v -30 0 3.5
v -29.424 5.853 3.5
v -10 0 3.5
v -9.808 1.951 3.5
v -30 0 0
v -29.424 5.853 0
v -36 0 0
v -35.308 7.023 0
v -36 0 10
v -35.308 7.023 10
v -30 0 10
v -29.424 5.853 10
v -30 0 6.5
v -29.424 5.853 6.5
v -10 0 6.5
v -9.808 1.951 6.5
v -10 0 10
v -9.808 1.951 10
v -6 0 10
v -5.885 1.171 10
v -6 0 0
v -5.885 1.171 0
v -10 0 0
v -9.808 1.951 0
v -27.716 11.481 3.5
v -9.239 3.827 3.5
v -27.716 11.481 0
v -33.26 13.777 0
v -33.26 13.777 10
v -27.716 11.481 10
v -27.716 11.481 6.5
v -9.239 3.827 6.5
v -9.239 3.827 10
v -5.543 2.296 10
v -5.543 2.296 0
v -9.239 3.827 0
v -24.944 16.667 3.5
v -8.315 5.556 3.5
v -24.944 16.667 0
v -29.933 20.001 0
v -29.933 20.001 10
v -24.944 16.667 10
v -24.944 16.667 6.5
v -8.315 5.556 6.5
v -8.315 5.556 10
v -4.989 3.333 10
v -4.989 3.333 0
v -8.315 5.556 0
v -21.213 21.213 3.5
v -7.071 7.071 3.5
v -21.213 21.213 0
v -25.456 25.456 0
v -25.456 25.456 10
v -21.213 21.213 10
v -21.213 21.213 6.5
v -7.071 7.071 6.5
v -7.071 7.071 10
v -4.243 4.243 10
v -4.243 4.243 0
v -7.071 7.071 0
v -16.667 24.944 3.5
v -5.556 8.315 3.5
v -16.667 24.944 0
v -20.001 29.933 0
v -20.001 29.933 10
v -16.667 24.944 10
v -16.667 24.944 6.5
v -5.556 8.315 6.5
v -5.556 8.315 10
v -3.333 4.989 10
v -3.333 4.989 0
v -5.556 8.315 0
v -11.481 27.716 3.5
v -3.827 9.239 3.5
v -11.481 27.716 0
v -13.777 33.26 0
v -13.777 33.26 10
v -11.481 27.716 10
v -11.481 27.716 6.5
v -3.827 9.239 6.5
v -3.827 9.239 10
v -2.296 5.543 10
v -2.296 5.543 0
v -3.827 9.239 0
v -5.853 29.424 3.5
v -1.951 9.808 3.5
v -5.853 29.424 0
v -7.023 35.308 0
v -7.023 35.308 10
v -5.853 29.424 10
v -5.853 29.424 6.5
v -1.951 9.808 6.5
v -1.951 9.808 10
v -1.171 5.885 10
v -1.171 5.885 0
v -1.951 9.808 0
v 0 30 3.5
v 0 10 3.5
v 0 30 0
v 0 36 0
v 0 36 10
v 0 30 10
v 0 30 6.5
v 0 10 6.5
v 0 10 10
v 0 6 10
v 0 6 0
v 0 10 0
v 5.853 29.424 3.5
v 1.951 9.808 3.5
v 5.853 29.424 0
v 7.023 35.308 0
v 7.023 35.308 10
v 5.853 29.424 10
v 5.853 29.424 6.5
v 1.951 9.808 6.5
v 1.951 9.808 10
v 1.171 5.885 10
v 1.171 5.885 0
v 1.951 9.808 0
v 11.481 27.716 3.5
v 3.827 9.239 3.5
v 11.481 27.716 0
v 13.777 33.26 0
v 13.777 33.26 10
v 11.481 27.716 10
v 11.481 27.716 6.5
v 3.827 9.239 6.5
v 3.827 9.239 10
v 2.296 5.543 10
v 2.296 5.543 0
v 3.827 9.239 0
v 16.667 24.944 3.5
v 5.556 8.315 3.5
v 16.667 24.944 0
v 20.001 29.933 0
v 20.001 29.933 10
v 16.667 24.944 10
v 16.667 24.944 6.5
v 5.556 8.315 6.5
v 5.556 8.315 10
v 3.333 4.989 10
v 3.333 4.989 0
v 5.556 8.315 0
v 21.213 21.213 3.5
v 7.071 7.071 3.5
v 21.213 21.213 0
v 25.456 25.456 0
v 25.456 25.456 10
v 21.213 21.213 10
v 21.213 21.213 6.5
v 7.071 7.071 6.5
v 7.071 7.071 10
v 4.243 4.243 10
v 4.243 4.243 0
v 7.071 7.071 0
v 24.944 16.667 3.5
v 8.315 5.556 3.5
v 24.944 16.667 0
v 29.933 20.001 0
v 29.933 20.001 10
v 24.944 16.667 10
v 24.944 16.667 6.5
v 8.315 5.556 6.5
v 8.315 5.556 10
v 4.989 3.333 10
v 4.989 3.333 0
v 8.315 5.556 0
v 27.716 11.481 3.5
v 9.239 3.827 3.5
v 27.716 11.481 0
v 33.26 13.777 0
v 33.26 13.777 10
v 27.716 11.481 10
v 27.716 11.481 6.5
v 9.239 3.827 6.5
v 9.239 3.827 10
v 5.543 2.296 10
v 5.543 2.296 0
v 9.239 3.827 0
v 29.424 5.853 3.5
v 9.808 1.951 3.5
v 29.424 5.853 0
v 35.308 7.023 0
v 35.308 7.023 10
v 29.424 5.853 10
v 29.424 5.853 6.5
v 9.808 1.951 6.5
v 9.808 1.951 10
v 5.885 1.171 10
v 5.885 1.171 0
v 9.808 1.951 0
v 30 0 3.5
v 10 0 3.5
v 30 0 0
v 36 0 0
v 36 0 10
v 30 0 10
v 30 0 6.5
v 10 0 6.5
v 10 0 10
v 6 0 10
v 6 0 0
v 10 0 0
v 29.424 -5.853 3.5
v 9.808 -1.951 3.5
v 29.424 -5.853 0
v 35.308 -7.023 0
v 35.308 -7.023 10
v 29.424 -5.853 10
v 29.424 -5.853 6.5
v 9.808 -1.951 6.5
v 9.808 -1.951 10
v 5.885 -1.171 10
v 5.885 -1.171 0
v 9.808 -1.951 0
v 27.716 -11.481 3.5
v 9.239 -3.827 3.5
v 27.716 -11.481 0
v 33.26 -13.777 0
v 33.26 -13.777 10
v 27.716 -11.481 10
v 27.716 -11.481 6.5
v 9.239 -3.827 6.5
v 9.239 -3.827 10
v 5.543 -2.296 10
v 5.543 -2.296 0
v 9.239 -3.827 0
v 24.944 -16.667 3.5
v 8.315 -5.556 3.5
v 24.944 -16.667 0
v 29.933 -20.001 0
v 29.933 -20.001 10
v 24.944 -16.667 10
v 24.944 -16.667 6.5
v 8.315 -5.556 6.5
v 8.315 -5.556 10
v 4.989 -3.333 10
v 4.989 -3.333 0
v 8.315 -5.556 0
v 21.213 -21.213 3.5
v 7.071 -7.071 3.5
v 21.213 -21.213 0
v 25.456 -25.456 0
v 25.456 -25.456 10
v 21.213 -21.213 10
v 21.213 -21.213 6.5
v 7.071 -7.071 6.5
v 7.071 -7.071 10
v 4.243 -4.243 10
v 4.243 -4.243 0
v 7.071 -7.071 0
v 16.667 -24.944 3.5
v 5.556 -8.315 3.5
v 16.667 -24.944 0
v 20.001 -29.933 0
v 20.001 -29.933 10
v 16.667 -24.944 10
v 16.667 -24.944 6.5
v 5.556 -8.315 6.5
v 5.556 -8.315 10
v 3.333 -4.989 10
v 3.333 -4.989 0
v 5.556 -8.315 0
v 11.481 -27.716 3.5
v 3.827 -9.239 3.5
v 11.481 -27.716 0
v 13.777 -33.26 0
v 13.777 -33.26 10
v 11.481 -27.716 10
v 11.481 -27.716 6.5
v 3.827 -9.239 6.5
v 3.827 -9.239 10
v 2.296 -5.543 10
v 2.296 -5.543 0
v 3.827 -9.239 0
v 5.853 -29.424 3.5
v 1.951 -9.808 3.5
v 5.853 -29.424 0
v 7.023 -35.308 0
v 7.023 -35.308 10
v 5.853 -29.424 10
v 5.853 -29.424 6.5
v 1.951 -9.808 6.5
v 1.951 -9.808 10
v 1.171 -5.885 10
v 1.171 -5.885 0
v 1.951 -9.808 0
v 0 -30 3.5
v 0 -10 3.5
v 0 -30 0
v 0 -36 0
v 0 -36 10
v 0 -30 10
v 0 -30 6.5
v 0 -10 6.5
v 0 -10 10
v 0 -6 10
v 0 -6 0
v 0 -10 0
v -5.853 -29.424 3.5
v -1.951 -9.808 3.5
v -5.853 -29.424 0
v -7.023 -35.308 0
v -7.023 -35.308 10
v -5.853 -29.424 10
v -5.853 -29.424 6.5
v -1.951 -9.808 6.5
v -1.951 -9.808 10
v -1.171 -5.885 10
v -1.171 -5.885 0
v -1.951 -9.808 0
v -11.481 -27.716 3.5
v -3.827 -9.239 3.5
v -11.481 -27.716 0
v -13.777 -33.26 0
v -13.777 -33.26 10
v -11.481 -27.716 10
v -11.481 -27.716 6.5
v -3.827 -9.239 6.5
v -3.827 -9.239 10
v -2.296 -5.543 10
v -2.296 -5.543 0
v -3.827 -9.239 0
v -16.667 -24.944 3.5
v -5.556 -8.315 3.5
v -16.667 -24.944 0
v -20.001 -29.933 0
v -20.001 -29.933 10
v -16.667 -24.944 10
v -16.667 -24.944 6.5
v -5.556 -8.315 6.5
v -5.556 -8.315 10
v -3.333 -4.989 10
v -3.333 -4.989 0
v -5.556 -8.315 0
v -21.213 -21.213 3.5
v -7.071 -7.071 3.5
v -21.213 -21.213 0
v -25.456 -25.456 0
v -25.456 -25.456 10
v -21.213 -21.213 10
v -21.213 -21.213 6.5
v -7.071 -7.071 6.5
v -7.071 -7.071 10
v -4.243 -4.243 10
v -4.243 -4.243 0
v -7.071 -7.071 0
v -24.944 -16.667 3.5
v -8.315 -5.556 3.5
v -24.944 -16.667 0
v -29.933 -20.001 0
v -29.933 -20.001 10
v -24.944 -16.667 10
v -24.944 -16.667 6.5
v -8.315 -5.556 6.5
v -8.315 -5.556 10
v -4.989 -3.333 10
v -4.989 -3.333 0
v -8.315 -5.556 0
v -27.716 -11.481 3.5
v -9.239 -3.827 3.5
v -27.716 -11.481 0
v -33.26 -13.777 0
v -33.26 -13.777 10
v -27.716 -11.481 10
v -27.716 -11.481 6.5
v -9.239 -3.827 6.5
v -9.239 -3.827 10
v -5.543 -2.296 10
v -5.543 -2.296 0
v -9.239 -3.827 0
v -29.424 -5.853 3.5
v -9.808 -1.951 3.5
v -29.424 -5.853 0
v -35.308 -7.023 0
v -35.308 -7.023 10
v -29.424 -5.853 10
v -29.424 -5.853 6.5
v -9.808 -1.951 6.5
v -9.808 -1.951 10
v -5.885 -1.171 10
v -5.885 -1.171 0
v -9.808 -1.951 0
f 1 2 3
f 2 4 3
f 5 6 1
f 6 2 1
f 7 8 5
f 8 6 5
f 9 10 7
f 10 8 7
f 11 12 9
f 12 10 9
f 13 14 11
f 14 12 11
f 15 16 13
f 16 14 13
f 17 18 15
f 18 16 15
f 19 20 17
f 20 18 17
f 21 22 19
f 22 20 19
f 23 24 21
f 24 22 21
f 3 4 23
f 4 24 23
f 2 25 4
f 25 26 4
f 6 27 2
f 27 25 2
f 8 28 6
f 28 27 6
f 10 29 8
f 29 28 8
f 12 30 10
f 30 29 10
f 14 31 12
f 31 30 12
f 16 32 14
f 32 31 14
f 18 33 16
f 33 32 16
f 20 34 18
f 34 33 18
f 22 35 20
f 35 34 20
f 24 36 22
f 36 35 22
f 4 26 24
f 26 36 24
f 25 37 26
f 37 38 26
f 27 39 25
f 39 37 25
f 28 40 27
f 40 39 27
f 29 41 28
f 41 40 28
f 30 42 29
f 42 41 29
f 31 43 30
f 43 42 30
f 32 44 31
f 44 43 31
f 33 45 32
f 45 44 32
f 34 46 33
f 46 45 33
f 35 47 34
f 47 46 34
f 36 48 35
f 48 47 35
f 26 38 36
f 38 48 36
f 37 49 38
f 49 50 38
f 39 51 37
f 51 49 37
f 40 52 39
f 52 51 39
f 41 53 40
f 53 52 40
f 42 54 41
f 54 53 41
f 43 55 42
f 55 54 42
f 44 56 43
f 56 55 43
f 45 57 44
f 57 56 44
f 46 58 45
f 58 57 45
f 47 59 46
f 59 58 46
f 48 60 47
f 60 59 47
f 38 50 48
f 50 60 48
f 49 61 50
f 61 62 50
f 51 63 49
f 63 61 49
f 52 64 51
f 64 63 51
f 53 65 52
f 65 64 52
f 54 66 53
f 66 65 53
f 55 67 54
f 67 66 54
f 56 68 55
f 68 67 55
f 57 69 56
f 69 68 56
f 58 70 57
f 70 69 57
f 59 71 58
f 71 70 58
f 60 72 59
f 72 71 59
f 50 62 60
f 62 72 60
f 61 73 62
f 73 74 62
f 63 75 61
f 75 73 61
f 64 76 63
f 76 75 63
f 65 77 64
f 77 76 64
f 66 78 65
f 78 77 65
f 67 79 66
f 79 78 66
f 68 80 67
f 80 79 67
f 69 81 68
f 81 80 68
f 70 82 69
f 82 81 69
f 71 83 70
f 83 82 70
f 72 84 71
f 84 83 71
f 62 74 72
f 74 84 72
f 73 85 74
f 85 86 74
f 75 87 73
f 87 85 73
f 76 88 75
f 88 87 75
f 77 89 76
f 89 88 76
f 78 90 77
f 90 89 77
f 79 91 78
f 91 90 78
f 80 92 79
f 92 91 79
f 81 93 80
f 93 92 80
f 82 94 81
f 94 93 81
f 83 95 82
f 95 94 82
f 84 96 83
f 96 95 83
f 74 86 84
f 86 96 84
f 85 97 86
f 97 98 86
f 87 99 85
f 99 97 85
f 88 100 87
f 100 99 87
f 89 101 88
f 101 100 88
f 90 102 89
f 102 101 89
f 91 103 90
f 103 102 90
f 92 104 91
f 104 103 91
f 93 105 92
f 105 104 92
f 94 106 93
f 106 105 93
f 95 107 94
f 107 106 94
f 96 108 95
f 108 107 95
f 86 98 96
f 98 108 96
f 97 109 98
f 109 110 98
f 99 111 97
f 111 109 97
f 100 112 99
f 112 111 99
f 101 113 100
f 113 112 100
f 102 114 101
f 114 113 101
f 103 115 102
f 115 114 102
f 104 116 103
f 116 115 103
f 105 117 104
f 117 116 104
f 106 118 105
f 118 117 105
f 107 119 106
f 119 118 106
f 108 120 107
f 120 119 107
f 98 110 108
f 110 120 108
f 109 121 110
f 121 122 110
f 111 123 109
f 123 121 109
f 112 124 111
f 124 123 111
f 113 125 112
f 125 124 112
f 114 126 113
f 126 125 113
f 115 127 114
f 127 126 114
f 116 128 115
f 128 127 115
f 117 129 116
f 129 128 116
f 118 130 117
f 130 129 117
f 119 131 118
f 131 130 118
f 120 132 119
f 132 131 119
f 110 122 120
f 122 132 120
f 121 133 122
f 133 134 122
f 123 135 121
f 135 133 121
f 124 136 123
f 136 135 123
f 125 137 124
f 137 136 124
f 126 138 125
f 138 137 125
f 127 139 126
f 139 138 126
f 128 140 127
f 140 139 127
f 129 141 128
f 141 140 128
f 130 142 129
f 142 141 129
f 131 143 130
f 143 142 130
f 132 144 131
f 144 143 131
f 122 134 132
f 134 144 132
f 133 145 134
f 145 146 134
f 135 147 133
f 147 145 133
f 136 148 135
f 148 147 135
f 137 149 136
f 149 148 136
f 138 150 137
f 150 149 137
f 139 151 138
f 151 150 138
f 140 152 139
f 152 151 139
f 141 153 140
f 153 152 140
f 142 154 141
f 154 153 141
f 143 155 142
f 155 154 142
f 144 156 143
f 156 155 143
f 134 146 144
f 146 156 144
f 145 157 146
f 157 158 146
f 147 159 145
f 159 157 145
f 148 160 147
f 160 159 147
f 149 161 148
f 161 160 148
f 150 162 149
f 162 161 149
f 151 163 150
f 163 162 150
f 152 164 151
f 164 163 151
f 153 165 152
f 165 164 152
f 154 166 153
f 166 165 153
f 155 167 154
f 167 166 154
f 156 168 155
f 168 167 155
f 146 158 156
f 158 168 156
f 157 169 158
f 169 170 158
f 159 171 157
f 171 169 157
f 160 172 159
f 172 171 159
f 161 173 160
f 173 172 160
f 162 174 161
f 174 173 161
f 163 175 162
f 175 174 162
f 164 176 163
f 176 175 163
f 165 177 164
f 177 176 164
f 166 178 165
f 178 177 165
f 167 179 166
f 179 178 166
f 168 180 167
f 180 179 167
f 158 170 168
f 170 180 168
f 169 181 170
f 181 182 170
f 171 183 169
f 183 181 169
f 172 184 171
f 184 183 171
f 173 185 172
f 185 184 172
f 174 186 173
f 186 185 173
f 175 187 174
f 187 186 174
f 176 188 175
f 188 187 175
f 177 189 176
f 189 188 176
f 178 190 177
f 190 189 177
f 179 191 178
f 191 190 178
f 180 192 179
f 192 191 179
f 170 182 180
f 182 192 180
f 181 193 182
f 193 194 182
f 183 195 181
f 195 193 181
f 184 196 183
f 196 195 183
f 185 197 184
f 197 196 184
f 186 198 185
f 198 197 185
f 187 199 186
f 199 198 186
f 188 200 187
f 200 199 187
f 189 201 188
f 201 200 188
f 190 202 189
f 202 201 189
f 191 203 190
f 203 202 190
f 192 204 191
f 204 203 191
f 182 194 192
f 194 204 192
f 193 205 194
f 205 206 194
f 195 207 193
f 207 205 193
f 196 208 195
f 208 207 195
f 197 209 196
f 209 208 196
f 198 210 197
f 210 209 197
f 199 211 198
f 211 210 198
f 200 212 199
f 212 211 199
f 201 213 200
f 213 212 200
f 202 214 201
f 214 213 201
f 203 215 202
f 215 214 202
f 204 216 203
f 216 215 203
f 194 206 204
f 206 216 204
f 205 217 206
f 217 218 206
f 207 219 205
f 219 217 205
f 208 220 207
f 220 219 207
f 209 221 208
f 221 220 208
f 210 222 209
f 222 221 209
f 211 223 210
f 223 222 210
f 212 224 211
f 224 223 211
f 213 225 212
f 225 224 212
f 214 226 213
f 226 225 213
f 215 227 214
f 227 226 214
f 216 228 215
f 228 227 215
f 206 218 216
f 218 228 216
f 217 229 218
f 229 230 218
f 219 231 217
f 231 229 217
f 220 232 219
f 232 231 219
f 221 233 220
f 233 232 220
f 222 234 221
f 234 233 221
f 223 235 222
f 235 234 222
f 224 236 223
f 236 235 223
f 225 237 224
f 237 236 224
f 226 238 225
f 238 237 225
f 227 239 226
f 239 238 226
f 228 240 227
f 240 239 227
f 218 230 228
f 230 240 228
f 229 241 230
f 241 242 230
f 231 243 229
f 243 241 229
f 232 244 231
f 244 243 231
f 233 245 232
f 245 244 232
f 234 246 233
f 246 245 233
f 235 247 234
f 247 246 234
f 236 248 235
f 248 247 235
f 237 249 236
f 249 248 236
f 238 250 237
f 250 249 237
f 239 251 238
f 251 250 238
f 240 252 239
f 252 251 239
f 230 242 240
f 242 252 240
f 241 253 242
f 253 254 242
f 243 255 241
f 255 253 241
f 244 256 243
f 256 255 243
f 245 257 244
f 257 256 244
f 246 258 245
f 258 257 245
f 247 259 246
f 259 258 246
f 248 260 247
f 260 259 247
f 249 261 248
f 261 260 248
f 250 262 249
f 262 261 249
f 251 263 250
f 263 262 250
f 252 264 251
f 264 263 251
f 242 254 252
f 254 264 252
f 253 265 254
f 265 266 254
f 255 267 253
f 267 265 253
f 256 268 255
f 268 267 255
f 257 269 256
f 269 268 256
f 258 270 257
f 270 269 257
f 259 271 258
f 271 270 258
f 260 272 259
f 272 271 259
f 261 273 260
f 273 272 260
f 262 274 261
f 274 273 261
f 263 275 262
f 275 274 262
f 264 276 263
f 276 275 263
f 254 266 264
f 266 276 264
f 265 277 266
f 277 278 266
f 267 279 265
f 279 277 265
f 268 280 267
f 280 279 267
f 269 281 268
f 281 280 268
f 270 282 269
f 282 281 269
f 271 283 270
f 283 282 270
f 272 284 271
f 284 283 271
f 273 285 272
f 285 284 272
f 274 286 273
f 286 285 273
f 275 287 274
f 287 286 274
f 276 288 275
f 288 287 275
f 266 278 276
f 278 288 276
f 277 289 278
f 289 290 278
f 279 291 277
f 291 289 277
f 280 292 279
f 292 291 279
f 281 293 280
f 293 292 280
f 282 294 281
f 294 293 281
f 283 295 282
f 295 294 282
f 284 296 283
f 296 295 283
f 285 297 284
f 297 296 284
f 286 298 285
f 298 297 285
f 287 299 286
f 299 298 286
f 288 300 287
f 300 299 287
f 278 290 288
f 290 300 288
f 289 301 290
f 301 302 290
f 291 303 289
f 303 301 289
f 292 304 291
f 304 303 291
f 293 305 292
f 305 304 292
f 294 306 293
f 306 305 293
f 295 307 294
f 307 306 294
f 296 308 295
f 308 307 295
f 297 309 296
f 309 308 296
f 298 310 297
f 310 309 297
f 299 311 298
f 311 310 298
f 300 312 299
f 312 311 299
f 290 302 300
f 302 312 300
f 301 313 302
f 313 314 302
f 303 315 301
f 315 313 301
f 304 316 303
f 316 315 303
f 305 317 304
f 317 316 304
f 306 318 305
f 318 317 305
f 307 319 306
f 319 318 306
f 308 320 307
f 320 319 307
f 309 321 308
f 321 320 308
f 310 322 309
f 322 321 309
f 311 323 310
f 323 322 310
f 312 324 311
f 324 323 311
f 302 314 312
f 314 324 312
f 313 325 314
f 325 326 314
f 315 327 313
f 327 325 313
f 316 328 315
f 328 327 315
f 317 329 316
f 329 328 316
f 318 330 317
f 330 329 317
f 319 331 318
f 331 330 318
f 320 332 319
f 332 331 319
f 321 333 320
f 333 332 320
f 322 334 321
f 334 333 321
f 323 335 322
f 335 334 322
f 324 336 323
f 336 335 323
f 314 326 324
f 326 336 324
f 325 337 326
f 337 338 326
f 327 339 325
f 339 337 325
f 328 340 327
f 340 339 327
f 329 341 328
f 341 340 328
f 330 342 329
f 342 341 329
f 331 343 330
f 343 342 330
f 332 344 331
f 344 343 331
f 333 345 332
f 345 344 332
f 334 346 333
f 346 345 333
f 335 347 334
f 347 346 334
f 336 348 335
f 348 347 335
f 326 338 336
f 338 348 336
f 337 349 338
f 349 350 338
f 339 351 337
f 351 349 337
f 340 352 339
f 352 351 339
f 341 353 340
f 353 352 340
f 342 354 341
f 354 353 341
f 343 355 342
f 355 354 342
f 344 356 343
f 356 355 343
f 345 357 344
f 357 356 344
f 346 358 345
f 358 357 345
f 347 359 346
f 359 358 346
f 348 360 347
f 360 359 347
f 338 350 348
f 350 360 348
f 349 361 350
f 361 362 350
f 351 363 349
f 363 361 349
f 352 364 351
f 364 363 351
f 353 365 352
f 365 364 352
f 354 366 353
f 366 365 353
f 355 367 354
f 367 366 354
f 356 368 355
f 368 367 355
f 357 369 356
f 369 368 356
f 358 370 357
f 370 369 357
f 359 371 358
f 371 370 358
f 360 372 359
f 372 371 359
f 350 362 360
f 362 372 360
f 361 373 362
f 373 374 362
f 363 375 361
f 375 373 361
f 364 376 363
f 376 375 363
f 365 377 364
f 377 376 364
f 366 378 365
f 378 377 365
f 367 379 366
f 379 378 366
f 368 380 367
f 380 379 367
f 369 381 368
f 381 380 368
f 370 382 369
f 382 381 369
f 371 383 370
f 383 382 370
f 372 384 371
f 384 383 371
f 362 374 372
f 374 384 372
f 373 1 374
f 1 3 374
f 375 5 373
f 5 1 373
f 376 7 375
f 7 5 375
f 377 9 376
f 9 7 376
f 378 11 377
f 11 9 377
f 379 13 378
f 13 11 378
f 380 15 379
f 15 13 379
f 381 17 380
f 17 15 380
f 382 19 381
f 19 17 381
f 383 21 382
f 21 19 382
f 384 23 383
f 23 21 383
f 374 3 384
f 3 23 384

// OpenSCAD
$fn = 32;

// ----------------------------------------------------------------------
// Revolved part: handwheel R36
// ----------------------------------------------------------------------

// --- parameters (mm) ---
bore_r = 6;               // bore radius
rim_r = 36;               // rim radius
rim_w = 6;                // rim axial width
rim_t = 10;               // rim diameter height
hub_r = 10;               // hub radius
web_t = 3;                // web thickness
revolve_angle = 360;      // revolve sweep, degrees

bore_d = 2 * bore_r;
rim_d = 2 * rim_r;
hub_d = 2 * hub_r;

profile = [[6, 0], [10, 0], [10, 3.5], [30, 3.5], [30, 0], [36, 0], [36, 10], [30, 10], [30, 6.5], [10, 6.5], [10, 10], [6, 10]];  // primary outline, 12 points, counter clockwise

// --- the one profile operation ---
rotate_extrude(angle = revolve_angle) polygon(points = profile);
